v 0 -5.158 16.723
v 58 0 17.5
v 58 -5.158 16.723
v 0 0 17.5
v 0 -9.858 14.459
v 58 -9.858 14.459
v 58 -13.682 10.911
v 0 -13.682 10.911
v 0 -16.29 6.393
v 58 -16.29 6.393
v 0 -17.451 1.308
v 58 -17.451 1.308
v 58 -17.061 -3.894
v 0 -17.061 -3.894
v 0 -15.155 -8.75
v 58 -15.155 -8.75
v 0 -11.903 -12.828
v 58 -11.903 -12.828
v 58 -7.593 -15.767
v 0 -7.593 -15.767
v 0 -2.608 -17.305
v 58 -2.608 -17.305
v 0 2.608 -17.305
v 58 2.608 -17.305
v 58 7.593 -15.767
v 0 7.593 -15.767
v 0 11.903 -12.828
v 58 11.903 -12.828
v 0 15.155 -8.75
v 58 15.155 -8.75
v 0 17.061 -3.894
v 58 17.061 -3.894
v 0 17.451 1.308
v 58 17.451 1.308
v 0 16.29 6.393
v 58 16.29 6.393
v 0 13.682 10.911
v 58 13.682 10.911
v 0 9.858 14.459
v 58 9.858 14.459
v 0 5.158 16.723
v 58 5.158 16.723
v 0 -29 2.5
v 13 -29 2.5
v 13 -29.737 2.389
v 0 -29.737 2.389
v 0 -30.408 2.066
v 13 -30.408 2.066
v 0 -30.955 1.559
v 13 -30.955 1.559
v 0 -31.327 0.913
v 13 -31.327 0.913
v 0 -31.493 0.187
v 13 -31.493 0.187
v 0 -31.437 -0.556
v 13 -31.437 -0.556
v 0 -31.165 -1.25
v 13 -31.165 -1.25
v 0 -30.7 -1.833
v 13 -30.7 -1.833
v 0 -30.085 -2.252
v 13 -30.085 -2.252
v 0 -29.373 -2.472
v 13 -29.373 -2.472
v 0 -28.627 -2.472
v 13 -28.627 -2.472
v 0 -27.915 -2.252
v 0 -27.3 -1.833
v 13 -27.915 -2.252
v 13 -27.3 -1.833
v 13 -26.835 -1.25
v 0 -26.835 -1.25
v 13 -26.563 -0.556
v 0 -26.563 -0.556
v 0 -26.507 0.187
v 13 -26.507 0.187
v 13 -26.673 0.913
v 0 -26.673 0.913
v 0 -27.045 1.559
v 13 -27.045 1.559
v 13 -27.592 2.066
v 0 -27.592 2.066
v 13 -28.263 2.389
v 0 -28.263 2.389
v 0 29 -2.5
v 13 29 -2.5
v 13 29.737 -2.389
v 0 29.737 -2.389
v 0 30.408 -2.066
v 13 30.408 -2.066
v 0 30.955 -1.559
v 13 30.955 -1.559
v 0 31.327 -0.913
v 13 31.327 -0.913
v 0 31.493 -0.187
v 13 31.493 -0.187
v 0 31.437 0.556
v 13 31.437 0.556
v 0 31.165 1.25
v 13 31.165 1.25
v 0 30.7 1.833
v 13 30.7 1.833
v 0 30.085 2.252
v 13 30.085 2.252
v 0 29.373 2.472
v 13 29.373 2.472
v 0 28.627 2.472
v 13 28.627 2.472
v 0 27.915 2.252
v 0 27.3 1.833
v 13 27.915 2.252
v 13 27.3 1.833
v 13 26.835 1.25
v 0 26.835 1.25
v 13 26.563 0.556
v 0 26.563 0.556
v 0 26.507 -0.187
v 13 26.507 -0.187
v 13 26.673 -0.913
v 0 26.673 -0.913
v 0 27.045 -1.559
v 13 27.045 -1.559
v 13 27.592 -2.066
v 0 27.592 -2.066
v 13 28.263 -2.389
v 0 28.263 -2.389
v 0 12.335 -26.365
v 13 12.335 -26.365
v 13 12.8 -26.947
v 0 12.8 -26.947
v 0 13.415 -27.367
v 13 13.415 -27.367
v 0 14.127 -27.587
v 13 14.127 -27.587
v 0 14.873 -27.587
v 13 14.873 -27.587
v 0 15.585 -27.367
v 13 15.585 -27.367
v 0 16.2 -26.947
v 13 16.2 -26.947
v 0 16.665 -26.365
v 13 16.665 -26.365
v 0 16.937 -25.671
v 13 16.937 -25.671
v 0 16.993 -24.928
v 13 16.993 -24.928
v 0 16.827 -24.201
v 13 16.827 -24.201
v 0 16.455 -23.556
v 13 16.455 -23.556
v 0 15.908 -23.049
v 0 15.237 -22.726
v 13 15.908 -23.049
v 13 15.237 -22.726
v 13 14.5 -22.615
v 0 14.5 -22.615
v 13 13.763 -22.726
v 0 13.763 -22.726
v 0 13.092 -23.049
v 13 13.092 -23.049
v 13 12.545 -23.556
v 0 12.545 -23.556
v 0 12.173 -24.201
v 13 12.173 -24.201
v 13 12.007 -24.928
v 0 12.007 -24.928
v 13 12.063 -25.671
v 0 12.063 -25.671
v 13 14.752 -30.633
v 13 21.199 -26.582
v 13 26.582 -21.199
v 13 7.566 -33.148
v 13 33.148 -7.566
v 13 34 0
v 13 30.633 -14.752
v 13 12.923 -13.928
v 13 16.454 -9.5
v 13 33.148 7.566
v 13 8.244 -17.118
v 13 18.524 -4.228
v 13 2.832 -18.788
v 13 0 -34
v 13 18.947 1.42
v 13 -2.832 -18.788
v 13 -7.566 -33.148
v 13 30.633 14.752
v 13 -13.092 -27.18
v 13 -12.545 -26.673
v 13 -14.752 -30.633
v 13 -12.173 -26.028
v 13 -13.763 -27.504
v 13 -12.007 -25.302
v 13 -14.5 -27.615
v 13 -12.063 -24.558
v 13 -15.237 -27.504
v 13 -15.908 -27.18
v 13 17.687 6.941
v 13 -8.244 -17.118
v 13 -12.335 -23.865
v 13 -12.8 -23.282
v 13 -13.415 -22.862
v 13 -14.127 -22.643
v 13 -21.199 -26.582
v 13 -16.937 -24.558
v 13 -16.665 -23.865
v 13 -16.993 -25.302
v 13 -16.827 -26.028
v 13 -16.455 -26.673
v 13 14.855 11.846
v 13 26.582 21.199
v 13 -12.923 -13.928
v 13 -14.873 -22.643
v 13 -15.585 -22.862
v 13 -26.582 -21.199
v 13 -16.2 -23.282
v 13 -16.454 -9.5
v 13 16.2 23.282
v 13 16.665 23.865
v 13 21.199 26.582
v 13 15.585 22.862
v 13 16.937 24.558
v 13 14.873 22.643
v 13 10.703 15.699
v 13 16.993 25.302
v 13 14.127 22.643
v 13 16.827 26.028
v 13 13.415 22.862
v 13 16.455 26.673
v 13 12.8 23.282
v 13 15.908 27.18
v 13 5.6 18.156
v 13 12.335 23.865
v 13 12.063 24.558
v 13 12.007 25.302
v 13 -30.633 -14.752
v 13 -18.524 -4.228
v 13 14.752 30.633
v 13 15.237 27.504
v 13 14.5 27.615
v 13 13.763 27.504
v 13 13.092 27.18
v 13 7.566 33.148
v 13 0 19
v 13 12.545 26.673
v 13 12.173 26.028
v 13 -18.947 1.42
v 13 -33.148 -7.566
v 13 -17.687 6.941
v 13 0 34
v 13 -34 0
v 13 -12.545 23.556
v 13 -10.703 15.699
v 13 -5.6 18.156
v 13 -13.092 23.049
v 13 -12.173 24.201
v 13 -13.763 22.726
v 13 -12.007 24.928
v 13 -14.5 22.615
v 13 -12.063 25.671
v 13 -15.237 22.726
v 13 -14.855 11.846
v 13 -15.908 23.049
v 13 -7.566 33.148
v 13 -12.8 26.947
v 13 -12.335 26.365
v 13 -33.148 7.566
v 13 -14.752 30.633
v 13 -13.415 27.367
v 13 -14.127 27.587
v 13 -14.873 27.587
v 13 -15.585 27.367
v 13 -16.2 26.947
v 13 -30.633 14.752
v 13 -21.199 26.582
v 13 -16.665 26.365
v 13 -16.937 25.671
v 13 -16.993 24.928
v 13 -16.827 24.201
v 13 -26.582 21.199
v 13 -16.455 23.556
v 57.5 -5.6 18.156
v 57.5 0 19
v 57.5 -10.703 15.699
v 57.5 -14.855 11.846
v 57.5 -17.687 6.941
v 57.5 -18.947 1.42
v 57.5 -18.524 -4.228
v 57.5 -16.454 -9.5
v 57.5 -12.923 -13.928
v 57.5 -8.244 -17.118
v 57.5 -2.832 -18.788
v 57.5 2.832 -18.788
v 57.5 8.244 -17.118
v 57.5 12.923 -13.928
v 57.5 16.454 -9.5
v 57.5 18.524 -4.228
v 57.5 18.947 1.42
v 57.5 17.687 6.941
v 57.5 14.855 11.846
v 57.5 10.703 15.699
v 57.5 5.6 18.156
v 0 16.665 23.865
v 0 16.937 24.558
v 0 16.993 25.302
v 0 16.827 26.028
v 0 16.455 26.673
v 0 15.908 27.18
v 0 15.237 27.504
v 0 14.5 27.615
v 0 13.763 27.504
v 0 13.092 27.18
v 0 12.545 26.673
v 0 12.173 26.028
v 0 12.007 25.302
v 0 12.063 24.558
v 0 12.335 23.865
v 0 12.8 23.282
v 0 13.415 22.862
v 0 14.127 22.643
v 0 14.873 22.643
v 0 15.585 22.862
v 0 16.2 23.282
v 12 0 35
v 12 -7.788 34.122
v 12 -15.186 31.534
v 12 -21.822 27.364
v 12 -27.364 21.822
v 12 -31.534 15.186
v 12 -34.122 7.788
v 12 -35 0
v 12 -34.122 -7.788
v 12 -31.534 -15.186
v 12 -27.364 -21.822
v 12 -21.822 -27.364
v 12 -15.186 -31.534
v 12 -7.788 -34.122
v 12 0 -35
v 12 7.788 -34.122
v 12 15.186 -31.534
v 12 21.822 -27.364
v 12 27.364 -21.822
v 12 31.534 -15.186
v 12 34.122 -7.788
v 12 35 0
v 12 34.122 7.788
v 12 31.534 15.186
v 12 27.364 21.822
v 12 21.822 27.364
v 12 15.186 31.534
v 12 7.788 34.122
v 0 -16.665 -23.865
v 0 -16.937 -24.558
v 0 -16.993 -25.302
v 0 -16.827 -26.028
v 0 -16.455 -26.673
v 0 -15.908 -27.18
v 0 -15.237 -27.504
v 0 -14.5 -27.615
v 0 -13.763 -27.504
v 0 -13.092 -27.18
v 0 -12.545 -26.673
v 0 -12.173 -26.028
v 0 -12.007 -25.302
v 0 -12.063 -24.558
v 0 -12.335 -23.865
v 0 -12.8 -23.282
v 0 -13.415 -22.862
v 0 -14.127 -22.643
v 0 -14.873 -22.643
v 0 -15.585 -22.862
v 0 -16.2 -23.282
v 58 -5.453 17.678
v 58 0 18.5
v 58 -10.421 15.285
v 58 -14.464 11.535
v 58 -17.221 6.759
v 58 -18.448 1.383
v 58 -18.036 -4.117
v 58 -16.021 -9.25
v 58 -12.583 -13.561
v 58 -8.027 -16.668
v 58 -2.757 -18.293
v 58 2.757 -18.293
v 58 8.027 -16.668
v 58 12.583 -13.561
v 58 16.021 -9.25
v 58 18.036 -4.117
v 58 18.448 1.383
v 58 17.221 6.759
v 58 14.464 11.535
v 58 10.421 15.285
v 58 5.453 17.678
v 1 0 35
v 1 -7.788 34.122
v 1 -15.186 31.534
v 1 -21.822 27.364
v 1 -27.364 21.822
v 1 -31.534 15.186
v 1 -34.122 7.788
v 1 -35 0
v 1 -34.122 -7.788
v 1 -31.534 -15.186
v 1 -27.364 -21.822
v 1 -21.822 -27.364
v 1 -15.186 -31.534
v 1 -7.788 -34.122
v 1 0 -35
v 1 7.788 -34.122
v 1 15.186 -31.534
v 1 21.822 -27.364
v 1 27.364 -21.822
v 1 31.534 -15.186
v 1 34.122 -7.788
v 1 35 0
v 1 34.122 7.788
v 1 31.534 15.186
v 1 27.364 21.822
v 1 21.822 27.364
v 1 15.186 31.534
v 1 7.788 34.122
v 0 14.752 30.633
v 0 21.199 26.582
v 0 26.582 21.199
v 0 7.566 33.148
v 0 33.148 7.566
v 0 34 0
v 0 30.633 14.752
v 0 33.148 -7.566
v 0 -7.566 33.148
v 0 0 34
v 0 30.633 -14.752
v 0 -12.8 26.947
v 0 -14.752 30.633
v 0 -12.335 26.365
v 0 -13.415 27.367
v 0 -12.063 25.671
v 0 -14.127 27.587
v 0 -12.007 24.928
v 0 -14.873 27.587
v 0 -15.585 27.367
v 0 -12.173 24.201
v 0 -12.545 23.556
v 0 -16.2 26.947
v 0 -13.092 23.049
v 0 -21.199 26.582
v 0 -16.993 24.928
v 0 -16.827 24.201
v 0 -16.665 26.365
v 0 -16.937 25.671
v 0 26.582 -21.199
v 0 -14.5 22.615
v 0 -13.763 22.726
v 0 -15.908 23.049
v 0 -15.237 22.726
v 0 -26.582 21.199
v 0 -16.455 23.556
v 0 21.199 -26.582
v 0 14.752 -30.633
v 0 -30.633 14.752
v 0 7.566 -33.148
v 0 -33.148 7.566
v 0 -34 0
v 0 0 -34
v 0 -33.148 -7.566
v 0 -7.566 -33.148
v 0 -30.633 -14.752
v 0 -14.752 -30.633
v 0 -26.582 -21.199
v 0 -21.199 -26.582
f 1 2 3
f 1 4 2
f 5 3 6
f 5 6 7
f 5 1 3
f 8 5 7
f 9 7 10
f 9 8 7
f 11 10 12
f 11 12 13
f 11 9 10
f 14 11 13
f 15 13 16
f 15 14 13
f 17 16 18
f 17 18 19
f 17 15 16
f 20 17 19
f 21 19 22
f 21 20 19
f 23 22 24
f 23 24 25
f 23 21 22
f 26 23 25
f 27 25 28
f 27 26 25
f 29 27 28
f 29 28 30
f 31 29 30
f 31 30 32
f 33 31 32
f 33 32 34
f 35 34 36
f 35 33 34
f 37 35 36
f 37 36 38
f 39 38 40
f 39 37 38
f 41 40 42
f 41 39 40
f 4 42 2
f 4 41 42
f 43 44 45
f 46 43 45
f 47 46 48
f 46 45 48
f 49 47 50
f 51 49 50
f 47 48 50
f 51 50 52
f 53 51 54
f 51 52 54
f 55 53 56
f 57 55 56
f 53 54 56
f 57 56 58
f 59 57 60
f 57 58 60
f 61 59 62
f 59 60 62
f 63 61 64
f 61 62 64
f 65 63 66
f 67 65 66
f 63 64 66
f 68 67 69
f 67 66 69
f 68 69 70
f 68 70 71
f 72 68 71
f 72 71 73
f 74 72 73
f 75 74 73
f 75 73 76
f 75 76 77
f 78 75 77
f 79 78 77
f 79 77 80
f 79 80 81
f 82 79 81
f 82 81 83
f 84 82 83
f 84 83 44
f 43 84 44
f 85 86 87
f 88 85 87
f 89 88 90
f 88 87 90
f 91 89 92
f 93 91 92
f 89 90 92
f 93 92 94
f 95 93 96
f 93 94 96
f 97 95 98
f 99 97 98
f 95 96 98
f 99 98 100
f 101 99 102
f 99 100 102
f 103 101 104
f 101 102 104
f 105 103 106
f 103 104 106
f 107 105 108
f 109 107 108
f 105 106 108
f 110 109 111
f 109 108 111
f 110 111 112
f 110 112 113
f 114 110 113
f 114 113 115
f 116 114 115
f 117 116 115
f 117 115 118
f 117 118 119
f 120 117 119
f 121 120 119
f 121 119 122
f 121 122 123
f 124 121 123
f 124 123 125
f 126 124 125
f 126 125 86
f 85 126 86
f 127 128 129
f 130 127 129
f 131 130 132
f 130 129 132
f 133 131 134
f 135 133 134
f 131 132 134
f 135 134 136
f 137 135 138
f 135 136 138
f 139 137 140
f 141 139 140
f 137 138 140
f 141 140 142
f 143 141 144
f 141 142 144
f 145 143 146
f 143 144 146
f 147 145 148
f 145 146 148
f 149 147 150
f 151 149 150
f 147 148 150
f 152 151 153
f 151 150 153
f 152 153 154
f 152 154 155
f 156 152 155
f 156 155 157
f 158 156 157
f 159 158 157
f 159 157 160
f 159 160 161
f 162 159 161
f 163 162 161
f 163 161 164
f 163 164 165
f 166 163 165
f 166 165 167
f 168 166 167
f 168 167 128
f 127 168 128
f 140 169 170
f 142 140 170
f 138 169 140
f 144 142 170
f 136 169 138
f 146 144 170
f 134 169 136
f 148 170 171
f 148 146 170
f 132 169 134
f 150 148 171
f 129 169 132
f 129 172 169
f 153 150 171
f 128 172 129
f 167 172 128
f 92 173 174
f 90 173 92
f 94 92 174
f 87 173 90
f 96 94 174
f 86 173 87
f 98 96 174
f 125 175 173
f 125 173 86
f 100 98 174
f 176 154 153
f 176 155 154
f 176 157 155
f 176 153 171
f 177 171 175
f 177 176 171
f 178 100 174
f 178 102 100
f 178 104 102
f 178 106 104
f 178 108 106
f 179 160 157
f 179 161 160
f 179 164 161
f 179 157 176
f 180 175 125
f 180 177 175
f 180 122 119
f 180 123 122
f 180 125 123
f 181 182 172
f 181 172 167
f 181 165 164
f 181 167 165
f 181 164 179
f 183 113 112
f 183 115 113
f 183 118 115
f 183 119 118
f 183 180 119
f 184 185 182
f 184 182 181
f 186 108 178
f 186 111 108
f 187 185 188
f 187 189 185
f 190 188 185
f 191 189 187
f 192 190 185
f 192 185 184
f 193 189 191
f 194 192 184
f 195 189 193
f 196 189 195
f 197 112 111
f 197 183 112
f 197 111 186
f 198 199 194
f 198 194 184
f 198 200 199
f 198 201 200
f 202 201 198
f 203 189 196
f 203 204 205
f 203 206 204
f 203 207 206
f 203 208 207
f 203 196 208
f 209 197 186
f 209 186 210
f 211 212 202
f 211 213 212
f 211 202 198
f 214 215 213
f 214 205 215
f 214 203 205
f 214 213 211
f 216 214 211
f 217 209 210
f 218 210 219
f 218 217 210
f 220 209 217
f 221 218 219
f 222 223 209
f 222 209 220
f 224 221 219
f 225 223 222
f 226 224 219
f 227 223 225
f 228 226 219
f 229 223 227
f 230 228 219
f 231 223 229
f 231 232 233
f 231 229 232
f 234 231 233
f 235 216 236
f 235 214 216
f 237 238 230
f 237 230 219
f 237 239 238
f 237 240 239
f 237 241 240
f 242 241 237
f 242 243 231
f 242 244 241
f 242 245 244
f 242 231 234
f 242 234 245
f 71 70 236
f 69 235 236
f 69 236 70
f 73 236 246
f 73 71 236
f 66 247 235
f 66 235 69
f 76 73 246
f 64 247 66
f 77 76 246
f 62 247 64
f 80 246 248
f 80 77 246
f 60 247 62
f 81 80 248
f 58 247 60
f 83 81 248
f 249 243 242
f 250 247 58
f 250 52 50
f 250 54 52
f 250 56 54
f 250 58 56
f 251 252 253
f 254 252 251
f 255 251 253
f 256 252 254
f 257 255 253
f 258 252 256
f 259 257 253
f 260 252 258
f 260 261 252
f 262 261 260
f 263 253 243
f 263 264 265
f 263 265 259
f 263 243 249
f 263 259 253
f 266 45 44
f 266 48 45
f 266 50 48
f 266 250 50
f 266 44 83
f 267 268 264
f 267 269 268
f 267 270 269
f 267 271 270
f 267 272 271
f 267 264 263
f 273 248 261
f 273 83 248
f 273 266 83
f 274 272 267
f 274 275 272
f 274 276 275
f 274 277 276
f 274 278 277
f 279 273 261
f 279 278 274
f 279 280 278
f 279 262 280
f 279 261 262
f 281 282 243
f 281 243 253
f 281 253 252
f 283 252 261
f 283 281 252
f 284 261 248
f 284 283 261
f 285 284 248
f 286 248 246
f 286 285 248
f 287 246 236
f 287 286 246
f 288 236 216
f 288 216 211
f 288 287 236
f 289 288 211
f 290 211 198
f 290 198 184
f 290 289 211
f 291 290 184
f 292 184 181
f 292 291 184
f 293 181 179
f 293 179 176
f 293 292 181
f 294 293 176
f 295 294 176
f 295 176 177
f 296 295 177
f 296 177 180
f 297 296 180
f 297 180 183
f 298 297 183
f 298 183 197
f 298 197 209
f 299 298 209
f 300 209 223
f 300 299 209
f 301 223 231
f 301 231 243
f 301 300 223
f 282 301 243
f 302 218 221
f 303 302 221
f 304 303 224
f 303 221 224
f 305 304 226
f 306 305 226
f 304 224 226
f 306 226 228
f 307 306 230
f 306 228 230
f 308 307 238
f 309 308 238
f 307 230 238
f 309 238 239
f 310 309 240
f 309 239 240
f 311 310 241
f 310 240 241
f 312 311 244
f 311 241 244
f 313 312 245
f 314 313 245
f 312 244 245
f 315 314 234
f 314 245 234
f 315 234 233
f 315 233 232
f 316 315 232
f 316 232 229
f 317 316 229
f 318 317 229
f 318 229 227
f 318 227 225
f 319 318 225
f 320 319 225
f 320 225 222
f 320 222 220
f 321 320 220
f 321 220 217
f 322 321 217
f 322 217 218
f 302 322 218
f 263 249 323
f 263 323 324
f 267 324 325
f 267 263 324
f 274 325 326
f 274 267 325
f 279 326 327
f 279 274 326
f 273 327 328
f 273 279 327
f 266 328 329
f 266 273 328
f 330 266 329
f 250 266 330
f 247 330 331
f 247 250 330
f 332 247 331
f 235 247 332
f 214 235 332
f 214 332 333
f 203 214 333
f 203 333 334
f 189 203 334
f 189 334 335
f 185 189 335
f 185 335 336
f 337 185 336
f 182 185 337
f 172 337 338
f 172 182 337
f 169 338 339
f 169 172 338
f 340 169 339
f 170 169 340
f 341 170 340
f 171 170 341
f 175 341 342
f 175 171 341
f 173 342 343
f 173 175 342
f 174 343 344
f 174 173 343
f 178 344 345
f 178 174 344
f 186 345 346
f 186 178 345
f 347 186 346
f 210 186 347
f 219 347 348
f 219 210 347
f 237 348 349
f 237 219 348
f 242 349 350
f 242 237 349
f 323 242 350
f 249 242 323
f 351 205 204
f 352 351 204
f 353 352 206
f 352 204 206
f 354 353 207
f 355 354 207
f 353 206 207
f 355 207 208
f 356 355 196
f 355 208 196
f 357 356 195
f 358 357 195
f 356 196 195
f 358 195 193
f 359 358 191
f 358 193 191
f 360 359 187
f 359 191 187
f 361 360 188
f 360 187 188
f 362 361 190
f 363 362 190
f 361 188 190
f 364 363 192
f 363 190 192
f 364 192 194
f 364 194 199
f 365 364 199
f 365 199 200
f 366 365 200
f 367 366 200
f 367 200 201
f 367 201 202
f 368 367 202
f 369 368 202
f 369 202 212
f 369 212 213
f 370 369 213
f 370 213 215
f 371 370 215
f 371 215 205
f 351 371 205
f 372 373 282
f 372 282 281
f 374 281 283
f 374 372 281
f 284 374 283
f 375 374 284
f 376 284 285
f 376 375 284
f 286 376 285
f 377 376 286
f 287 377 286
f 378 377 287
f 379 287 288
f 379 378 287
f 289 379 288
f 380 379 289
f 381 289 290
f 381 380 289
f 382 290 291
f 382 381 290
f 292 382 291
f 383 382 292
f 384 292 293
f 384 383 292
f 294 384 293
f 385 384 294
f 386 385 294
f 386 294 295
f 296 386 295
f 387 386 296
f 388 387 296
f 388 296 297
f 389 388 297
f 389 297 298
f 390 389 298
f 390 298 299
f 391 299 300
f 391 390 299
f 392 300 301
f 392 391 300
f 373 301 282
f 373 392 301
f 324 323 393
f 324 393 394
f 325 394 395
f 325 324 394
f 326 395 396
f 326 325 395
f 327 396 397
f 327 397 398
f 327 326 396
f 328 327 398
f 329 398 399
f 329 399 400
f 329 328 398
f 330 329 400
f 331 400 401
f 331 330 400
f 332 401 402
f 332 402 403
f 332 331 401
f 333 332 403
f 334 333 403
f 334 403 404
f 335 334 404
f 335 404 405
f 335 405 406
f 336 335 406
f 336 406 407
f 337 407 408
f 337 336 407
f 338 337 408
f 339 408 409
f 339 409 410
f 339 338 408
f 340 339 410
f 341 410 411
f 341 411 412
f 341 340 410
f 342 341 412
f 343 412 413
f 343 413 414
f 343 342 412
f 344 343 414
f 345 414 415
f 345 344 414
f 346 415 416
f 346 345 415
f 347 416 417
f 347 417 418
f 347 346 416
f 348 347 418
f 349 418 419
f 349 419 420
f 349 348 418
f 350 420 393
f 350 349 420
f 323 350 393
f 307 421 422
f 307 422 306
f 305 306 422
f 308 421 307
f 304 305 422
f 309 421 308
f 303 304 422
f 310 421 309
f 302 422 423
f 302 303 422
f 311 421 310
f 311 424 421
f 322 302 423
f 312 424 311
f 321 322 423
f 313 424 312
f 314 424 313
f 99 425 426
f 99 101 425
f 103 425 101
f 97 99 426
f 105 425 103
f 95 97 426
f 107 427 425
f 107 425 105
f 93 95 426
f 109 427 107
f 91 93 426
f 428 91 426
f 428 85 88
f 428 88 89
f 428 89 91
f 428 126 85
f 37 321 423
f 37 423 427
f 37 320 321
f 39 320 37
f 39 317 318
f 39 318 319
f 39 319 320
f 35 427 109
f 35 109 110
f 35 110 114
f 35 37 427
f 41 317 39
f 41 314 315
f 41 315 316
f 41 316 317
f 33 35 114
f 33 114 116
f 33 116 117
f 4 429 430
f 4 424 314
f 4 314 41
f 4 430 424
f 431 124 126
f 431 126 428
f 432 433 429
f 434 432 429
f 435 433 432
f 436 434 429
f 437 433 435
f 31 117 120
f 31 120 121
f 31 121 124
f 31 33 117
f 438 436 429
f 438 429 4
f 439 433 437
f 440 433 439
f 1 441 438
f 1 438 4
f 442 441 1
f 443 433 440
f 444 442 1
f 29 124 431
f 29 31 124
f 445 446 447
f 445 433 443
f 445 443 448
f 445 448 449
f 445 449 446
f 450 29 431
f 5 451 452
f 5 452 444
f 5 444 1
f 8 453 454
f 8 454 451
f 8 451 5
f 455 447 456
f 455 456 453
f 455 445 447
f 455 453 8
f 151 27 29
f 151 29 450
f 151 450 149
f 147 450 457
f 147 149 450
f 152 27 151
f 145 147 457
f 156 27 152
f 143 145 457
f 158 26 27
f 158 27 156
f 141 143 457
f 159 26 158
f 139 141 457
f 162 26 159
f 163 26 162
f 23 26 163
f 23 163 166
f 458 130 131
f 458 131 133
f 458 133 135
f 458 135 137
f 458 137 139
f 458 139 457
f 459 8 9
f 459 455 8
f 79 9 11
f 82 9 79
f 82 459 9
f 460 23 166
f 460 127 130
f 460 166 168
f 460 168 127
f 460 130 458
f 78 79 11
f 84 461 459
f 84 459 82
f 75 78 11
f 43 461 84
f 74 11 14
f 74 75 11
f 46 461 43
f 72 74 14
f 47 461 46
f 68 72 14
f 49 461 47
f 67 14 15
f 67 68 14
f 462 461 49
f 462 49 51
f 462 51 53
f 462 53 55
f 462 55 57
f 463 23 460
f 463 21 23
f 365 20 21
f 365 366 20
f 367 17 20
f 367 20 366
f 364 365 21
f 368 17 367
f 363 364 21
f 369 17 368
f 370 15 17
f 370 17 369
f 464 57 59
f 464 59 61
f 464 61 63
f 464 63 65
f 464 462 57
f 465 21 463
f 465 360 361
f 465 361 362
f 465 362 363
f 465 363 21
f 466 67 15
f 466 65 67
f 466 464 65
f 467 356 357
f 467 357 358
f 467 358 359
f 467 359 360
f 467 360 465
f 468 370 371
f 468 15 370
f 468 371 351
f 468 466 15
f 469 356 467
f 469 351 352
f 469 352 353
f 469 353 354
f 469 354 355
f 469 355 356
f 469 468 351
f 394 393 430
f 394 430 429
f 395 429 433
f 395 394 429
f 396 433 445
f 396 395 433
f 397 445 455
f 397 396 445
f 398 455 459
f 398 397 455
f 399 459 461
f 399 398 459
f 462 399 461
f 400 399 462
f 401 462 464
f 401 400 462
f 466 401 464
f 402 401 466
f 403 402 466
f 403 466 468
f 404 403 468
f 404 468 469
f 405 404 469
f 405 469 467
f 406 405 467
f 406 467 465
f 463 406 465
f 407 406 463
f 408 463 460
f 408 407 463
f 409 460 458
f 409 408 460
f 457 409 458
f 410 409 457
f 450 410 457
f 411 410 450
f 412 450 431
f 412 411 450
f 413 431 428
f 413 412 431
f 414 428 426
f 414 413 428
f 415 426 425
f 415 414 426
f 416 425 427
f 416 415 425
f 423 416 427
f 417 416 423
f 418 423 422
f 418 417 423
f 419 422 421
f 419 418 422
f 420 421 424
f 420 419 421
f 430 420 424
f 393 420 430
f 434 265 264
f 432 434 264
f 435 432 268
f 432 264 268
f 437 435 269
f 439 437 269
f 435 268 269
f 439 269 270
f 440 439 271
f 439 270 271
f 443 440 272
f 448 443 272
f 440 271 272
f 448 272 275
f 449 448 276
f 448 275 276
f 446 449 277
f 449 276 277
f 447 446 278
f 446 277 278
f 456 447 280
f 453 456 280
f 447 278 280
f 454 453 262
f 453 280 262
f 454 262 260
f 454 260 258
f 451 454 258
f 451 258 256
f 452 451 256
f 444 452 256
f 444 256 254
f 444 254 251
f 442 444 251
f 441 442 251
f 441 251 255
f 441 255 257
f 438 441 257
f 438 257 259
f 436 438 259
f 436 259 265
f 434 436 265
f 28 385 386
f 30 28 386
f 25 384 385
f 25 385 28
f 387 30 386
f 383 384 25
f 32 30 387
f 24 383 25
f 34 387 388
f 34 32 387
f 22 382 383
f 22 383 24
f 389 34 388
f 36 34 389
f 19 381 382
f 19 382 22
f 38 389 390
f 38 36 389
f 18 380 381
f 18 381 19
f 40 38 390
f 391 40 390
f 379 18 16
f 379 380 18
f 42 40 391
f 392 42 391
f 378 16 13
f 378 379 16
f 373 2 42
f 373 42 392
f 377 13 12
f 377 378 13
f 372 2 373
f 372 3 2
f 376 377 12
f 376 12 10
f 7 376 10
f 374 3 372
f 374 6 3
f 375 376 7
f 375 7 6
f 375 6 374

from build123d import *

# Parameters (mm, degrees)
HOLE_WIZARD_M6_1_D       = 5
PATTERN_CIRCULAR_1_COUNT = 6
CHAMFER_1_SIZE           = 1
CHAMFER_2_SIZE           = 1
CHAMFER_3_SIZE           = 0.5


with BuildPart() as part:
    # 스케치1 → 회전1 (revolve)
    with BuildSketch(Plane.XY, mode=Mode.PRIVATE) as revolve_1_sk:
        Polygon((0, 17.5), (0, 35), (13, 35), (13, 19), (58, 19), (58, 17.5), align=None)
    revolve(revolve_1_sk.sketch.rotate(Axis((0, 0, 0), (1, 0, 0)), 90), axis=Axis((0, 0, 0), (1, 0, 0)))

    # M6 나사 구멍1 (through all)
    with Locations(Plane.ZY):
        with Locations((0, 29)):
            hole_wizard_m6_1 = Hole(HOLE_WIZARD_M6_1_D / 2)

    # 원형 패턴1: M6 나사 구멍1 ×6 about axis
    pattern_circular_1_axis = Axis((0, 0, 0), (1, 0, 0))
    for i in range(1, PATTERN_CIRCULAR_1_COUNT):
        add(hole_wizard_m6_1.rotate(pattern_circular_1_axis, i * 360 / PATTERN_CIRCULAR_1_COUNT), mode=Mode.SUBTRACT)

    # 모따기1
    chamfer_1_edges = [part.edges().sort_by_distance(p)[0] for p in [
        (0, 0, -35),
    ]]
    chamfer(chamfer_1_edges, length=CHAMFER_1_SIZE)

    # 모따기2
    chamfer_2_edges = [part.edges().sort_by_distance(p)[0] for p in [
        (13, 0, -35),
    ]]
    chamfer(chamfer_2_edges, length=CHAMFER_2_SIZE)

    # 모따기3
    chamfer_3_edges = [part.edges().sort_by_distance(p)[0] for p in [
        (58, 0, -19),
    ]]
    chamfer(chamfer_3_edges, length=CHAMFER_3_SIZE)


solid = part.part
